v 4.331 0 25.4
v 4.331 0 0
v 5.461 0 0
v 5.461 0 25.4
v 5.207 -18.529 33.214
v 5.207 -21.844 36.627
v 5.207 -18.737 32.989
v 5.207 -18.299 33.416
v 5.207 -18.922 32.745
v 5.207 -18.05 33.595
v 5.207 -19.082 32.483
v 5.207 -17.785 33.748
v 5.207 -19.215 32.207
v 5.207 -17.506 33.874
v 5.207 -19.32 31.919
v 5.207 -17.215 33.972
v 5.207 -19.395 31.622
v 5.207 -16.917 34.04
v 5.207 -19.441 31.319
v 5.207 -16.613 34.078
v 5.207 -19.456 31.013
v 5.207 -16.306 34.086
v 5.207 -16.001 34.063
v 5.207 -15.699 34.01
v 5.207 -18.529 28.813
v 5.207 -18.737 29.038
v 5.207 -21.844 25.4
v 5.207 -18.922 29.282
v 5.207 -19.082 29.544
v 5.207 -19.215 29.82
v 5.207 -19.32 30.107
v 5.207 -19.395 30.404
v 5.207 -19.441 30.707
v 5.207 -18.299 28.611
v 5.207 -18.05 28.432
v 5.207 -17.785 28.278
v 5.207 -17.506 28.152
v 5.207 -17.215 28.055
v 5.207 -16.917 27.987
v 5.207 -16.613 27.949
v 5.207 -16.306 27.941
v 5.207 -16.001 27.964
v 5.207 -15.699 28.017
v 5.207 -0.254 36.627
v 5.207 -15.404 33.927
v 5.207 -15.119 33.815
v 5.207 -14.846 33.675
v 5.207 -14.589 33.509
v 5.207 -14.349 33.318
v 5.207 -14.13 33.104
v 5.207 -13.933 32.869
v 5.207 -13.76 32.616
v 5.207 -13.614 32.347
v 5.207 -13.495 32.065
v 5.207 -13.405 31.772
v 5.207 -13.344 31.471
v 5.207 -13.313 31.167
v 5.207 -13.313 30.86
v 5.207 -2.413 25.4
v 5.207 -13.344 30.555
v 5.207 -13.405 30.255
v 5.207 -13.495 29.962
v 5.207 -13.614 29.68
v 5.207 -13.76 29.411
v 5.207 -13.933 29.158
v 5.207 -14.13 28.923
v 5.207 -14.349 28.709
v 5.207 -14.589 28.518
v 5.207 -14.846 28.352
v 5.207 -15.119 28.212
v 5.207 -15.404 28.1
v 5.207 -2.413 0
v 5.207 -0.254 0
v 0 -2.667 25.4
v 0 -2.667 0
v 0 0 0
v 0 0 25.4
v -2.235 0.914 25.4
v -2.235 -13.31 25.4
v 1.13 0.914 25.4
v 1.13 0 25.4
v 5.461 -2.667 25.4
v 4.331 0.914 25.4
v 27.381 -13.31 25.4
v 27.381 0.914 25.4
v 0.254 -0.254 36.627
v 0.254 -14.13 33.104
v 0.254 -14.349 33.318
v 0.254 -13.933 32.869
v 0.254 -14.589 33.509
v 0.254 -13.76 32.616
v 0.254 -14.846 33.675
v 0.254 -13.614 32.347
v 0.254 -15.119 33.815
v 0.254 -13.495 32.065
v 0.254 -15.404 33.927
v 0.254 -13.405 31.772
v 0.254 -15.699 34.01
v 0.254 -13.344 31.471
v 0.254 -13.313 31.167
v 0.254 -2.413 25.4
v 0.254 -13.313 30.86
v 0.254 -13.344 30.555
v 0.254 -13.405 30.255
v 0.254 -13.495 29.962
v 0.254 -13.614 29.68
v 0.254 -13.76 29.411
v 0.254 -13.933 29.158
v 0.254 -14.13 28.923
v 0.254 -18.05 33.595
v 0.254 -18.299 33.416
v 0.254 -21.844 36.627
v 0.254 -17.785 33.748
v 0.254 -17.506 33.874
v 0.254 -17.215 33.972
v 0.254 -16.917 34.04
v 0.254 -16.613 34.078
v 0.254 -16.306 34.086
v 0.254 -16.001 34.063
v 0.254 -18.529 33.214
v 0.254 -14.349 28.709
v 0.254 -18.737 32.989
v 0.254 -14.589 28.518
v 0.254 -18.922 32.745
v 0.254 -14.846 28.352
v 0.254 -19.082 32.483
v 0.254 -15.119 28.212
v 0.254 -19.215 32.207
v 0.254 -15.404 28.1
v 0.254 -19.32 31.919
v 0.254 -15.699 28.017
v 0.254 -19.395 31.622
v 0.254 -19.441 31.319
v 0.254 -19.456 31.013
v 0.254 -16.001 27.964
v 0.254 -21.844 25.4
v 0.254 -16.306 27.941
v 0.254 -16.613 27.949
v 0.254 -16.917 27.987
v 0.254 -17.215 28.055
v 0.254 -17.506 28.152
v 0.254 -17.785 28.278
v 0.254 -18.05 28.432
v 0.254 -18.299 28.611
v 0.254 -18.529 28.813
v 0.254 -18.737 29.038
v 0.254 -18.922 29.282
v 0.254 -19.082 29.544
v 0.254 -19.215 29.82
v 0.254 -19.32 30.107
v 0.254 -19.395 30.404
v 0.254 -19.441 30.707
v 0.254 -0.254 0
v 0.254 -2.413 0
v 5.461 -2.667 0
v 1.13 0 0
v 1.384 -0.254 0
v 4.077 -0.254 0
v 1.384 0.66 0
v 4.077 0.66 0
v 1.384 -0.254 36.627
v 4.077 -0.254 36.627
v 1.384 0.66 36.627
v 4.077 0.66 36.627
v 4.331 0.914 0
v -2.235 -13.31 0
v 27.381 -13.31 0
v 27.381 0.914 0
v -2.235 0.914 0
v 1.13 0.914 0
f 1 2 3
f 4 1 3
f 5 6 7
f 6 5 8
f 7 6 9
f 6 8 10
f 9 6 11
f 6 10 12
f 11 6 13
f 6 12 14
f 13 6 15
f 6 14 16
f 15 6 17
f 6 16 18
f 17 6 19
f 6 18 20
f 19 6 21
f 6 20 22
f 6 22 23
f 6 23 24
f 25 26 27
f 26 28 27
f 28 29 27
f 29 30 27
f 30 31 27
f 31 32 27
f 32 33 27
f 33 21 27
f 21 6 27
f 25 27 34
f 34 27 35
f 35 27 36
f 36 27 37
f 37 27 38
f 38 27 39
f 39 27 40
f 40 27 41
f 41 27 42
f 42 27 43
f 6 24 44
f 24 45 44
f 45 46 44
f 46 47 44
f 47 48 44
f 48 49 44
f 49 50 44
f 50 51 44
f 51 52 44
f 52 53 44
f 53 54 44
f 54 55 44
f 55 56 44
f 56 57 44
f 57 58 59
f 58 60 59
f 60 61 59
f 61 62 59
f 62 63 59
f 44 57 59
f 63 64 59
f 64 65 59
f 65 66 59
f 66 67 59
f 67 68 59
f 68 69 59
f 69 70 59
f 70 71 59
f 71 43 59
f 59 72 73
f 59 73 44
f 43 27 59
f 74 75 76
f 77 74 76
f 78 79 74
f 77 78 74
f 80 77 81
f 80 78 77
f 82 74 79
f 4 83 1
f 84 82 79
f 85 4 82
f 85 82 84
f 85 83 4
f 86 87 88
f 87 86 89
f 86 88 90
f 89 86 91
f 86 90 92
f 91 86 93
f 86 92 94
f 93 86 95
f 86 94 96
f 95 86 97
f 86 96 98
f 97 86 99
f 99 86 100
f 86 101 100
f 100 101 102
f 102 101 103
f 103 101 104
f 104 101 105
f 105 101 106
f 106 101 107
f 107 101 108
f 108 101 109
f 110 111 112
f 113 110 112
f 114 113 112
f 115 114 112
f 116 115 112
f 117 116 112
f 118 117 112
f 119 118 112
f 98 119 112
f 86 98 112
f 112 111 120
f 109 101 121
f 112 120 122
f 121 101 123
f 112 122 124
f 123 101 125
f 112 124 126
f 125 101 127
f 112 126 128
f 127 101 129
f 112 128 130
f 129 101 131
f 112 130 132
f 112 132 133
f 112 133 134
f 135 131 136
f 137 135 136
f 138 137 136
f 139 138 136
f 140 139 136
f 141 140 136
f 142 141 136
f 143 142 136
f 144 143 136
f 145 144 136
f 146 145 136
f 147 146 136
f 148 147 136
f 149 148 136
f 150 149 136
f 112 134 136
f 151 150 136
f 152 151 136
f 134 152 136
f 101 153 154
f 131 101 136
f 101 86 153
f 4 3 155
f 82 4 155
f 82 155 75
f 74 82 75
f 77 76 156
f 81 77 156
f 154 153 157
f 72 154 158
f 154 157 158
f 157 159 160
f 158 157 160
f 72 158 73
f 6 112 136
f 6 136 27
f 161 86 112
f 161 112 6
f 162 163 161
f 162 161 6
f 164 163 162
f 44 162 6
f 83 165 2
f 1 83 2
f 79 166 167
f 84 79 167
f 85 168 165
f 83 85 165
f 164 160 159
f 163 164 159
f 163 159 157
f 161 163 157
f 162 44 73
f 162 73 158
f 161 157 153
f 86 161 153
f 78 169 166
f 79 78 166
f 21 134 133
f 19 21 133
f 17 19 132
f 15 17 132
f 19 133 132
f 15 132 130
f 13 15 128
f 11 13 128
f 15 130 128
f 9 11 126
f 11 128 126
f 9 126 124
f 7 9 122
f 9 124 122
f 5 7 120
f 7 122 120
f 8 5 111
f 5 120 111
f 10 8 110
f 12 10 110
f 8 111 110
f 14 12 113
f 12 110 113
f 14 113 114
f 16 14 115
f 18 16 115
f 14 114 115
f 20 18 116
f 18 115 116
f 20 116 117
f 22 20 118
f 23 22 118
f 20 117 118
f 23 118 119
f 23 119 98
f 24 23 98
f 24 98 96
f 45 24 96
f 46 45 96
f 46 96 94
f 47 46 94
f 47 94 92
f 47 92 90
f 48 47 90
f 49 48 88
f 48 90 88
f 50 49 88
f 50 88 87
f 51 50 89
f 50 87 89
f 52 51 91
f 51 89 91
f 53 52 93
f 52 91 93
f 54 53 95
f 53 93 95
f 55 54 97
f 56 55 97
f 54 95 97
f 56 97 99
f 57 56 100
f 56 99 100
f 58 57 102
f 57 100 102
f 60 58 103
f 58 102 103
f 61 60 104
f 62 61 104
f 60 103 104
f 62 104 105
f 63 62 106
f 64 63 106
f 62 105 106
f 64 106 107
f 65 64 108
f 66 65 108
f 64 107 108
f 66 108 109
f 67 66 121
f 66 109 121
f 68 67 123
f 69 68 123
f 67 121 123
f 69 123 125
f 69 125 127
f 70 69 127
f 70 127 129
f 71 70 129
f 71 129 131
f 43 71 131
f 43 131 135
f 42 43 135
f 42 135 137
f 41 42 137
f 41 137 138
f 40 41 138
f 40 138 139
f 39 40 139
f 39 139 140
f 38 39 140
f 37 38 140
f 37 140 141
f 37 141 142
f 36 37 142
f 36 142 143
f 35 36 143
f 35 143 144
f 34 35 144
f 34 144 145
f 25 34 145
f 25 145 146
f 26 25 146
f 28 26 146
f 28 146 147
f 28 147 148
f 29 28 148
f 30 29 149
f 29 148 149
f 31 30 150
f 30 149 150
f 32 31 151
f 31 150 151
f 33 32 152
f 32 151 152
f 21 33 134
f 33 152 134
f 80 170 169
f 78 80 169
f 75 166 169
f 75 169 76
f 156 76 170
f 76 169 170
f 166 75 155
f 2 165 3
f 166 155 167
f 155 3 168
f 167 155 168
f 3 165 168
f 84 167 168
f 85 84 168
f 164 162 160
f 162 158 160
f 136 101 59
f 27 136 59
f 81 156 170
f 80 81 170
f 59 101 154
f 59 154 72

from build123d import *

# Parameters (mm, degrees)
F1_DEPTH = 25.4
F3_DEPTH = 25.4
F5_DEPTH = 11.2268
F6_R     = 3.0734
F7_DEPTH = 4.953


with BuildPart() as f1:
    # F0 (on Top) → F1 (new body)
    with BuildSketch(Plane.XY):
        Polygon((0, -2.667), (0, 0), (1.1303, 0), (1.1303, 0.9144), (-2.2352, 0.9144), (-2.2352, -13.3096), (27.3812, -13.3096), (27.3812, 0.9144), (4.3307, 0.9144), (4.3307, 0), (5.461, 0), (5.461, -2.667), align=None)
    extrude(amount=F1_DEPTH)


with BuildPart() as f3:
    # F2 (on face) → F3 (new body, through all)
    with BuildSketch(Plane.XY.offset(25.4)):
        Polygon((1.3843, -0.254), (0.254, -0.254), (0.254, -2.413), (5.207, -2.413), (5.207, -0.254), (4.0767, -0.254), (4.0767, 0.6604), (1.3843, 0.6604), align=None)
    extrude(amount=-F3_DEPTH)

    # F4 (on face) → F5 (join)
    with BuildSketch(Plane.XY.offset(25.4)):
        Polygon((1.3843, -0.254), (0.254, -0.254), (0.254, -21.844), (5.207, -21.844), (5.207, -0.254), (4.0767, -0.254), (4.0767, 0.6604), (1.3843, 0.6604), align=None)
    extrude(amount=F5_DEPTH)

    # F6 (on face) → F7 (cut, through all)
    with BuildSketch(Plane(origin=(0.254, 0, 0), x_dir=(0, -1, 0), z_dir=(-1, 0, 0))):
        with Locations((16.383, 31.0134)):
            Circle(F6_R)
    extrude(amount=-F7_DEPTH, mode=Mode.SUBTRACT)


solid = Compound([f1.part, f3.part])
